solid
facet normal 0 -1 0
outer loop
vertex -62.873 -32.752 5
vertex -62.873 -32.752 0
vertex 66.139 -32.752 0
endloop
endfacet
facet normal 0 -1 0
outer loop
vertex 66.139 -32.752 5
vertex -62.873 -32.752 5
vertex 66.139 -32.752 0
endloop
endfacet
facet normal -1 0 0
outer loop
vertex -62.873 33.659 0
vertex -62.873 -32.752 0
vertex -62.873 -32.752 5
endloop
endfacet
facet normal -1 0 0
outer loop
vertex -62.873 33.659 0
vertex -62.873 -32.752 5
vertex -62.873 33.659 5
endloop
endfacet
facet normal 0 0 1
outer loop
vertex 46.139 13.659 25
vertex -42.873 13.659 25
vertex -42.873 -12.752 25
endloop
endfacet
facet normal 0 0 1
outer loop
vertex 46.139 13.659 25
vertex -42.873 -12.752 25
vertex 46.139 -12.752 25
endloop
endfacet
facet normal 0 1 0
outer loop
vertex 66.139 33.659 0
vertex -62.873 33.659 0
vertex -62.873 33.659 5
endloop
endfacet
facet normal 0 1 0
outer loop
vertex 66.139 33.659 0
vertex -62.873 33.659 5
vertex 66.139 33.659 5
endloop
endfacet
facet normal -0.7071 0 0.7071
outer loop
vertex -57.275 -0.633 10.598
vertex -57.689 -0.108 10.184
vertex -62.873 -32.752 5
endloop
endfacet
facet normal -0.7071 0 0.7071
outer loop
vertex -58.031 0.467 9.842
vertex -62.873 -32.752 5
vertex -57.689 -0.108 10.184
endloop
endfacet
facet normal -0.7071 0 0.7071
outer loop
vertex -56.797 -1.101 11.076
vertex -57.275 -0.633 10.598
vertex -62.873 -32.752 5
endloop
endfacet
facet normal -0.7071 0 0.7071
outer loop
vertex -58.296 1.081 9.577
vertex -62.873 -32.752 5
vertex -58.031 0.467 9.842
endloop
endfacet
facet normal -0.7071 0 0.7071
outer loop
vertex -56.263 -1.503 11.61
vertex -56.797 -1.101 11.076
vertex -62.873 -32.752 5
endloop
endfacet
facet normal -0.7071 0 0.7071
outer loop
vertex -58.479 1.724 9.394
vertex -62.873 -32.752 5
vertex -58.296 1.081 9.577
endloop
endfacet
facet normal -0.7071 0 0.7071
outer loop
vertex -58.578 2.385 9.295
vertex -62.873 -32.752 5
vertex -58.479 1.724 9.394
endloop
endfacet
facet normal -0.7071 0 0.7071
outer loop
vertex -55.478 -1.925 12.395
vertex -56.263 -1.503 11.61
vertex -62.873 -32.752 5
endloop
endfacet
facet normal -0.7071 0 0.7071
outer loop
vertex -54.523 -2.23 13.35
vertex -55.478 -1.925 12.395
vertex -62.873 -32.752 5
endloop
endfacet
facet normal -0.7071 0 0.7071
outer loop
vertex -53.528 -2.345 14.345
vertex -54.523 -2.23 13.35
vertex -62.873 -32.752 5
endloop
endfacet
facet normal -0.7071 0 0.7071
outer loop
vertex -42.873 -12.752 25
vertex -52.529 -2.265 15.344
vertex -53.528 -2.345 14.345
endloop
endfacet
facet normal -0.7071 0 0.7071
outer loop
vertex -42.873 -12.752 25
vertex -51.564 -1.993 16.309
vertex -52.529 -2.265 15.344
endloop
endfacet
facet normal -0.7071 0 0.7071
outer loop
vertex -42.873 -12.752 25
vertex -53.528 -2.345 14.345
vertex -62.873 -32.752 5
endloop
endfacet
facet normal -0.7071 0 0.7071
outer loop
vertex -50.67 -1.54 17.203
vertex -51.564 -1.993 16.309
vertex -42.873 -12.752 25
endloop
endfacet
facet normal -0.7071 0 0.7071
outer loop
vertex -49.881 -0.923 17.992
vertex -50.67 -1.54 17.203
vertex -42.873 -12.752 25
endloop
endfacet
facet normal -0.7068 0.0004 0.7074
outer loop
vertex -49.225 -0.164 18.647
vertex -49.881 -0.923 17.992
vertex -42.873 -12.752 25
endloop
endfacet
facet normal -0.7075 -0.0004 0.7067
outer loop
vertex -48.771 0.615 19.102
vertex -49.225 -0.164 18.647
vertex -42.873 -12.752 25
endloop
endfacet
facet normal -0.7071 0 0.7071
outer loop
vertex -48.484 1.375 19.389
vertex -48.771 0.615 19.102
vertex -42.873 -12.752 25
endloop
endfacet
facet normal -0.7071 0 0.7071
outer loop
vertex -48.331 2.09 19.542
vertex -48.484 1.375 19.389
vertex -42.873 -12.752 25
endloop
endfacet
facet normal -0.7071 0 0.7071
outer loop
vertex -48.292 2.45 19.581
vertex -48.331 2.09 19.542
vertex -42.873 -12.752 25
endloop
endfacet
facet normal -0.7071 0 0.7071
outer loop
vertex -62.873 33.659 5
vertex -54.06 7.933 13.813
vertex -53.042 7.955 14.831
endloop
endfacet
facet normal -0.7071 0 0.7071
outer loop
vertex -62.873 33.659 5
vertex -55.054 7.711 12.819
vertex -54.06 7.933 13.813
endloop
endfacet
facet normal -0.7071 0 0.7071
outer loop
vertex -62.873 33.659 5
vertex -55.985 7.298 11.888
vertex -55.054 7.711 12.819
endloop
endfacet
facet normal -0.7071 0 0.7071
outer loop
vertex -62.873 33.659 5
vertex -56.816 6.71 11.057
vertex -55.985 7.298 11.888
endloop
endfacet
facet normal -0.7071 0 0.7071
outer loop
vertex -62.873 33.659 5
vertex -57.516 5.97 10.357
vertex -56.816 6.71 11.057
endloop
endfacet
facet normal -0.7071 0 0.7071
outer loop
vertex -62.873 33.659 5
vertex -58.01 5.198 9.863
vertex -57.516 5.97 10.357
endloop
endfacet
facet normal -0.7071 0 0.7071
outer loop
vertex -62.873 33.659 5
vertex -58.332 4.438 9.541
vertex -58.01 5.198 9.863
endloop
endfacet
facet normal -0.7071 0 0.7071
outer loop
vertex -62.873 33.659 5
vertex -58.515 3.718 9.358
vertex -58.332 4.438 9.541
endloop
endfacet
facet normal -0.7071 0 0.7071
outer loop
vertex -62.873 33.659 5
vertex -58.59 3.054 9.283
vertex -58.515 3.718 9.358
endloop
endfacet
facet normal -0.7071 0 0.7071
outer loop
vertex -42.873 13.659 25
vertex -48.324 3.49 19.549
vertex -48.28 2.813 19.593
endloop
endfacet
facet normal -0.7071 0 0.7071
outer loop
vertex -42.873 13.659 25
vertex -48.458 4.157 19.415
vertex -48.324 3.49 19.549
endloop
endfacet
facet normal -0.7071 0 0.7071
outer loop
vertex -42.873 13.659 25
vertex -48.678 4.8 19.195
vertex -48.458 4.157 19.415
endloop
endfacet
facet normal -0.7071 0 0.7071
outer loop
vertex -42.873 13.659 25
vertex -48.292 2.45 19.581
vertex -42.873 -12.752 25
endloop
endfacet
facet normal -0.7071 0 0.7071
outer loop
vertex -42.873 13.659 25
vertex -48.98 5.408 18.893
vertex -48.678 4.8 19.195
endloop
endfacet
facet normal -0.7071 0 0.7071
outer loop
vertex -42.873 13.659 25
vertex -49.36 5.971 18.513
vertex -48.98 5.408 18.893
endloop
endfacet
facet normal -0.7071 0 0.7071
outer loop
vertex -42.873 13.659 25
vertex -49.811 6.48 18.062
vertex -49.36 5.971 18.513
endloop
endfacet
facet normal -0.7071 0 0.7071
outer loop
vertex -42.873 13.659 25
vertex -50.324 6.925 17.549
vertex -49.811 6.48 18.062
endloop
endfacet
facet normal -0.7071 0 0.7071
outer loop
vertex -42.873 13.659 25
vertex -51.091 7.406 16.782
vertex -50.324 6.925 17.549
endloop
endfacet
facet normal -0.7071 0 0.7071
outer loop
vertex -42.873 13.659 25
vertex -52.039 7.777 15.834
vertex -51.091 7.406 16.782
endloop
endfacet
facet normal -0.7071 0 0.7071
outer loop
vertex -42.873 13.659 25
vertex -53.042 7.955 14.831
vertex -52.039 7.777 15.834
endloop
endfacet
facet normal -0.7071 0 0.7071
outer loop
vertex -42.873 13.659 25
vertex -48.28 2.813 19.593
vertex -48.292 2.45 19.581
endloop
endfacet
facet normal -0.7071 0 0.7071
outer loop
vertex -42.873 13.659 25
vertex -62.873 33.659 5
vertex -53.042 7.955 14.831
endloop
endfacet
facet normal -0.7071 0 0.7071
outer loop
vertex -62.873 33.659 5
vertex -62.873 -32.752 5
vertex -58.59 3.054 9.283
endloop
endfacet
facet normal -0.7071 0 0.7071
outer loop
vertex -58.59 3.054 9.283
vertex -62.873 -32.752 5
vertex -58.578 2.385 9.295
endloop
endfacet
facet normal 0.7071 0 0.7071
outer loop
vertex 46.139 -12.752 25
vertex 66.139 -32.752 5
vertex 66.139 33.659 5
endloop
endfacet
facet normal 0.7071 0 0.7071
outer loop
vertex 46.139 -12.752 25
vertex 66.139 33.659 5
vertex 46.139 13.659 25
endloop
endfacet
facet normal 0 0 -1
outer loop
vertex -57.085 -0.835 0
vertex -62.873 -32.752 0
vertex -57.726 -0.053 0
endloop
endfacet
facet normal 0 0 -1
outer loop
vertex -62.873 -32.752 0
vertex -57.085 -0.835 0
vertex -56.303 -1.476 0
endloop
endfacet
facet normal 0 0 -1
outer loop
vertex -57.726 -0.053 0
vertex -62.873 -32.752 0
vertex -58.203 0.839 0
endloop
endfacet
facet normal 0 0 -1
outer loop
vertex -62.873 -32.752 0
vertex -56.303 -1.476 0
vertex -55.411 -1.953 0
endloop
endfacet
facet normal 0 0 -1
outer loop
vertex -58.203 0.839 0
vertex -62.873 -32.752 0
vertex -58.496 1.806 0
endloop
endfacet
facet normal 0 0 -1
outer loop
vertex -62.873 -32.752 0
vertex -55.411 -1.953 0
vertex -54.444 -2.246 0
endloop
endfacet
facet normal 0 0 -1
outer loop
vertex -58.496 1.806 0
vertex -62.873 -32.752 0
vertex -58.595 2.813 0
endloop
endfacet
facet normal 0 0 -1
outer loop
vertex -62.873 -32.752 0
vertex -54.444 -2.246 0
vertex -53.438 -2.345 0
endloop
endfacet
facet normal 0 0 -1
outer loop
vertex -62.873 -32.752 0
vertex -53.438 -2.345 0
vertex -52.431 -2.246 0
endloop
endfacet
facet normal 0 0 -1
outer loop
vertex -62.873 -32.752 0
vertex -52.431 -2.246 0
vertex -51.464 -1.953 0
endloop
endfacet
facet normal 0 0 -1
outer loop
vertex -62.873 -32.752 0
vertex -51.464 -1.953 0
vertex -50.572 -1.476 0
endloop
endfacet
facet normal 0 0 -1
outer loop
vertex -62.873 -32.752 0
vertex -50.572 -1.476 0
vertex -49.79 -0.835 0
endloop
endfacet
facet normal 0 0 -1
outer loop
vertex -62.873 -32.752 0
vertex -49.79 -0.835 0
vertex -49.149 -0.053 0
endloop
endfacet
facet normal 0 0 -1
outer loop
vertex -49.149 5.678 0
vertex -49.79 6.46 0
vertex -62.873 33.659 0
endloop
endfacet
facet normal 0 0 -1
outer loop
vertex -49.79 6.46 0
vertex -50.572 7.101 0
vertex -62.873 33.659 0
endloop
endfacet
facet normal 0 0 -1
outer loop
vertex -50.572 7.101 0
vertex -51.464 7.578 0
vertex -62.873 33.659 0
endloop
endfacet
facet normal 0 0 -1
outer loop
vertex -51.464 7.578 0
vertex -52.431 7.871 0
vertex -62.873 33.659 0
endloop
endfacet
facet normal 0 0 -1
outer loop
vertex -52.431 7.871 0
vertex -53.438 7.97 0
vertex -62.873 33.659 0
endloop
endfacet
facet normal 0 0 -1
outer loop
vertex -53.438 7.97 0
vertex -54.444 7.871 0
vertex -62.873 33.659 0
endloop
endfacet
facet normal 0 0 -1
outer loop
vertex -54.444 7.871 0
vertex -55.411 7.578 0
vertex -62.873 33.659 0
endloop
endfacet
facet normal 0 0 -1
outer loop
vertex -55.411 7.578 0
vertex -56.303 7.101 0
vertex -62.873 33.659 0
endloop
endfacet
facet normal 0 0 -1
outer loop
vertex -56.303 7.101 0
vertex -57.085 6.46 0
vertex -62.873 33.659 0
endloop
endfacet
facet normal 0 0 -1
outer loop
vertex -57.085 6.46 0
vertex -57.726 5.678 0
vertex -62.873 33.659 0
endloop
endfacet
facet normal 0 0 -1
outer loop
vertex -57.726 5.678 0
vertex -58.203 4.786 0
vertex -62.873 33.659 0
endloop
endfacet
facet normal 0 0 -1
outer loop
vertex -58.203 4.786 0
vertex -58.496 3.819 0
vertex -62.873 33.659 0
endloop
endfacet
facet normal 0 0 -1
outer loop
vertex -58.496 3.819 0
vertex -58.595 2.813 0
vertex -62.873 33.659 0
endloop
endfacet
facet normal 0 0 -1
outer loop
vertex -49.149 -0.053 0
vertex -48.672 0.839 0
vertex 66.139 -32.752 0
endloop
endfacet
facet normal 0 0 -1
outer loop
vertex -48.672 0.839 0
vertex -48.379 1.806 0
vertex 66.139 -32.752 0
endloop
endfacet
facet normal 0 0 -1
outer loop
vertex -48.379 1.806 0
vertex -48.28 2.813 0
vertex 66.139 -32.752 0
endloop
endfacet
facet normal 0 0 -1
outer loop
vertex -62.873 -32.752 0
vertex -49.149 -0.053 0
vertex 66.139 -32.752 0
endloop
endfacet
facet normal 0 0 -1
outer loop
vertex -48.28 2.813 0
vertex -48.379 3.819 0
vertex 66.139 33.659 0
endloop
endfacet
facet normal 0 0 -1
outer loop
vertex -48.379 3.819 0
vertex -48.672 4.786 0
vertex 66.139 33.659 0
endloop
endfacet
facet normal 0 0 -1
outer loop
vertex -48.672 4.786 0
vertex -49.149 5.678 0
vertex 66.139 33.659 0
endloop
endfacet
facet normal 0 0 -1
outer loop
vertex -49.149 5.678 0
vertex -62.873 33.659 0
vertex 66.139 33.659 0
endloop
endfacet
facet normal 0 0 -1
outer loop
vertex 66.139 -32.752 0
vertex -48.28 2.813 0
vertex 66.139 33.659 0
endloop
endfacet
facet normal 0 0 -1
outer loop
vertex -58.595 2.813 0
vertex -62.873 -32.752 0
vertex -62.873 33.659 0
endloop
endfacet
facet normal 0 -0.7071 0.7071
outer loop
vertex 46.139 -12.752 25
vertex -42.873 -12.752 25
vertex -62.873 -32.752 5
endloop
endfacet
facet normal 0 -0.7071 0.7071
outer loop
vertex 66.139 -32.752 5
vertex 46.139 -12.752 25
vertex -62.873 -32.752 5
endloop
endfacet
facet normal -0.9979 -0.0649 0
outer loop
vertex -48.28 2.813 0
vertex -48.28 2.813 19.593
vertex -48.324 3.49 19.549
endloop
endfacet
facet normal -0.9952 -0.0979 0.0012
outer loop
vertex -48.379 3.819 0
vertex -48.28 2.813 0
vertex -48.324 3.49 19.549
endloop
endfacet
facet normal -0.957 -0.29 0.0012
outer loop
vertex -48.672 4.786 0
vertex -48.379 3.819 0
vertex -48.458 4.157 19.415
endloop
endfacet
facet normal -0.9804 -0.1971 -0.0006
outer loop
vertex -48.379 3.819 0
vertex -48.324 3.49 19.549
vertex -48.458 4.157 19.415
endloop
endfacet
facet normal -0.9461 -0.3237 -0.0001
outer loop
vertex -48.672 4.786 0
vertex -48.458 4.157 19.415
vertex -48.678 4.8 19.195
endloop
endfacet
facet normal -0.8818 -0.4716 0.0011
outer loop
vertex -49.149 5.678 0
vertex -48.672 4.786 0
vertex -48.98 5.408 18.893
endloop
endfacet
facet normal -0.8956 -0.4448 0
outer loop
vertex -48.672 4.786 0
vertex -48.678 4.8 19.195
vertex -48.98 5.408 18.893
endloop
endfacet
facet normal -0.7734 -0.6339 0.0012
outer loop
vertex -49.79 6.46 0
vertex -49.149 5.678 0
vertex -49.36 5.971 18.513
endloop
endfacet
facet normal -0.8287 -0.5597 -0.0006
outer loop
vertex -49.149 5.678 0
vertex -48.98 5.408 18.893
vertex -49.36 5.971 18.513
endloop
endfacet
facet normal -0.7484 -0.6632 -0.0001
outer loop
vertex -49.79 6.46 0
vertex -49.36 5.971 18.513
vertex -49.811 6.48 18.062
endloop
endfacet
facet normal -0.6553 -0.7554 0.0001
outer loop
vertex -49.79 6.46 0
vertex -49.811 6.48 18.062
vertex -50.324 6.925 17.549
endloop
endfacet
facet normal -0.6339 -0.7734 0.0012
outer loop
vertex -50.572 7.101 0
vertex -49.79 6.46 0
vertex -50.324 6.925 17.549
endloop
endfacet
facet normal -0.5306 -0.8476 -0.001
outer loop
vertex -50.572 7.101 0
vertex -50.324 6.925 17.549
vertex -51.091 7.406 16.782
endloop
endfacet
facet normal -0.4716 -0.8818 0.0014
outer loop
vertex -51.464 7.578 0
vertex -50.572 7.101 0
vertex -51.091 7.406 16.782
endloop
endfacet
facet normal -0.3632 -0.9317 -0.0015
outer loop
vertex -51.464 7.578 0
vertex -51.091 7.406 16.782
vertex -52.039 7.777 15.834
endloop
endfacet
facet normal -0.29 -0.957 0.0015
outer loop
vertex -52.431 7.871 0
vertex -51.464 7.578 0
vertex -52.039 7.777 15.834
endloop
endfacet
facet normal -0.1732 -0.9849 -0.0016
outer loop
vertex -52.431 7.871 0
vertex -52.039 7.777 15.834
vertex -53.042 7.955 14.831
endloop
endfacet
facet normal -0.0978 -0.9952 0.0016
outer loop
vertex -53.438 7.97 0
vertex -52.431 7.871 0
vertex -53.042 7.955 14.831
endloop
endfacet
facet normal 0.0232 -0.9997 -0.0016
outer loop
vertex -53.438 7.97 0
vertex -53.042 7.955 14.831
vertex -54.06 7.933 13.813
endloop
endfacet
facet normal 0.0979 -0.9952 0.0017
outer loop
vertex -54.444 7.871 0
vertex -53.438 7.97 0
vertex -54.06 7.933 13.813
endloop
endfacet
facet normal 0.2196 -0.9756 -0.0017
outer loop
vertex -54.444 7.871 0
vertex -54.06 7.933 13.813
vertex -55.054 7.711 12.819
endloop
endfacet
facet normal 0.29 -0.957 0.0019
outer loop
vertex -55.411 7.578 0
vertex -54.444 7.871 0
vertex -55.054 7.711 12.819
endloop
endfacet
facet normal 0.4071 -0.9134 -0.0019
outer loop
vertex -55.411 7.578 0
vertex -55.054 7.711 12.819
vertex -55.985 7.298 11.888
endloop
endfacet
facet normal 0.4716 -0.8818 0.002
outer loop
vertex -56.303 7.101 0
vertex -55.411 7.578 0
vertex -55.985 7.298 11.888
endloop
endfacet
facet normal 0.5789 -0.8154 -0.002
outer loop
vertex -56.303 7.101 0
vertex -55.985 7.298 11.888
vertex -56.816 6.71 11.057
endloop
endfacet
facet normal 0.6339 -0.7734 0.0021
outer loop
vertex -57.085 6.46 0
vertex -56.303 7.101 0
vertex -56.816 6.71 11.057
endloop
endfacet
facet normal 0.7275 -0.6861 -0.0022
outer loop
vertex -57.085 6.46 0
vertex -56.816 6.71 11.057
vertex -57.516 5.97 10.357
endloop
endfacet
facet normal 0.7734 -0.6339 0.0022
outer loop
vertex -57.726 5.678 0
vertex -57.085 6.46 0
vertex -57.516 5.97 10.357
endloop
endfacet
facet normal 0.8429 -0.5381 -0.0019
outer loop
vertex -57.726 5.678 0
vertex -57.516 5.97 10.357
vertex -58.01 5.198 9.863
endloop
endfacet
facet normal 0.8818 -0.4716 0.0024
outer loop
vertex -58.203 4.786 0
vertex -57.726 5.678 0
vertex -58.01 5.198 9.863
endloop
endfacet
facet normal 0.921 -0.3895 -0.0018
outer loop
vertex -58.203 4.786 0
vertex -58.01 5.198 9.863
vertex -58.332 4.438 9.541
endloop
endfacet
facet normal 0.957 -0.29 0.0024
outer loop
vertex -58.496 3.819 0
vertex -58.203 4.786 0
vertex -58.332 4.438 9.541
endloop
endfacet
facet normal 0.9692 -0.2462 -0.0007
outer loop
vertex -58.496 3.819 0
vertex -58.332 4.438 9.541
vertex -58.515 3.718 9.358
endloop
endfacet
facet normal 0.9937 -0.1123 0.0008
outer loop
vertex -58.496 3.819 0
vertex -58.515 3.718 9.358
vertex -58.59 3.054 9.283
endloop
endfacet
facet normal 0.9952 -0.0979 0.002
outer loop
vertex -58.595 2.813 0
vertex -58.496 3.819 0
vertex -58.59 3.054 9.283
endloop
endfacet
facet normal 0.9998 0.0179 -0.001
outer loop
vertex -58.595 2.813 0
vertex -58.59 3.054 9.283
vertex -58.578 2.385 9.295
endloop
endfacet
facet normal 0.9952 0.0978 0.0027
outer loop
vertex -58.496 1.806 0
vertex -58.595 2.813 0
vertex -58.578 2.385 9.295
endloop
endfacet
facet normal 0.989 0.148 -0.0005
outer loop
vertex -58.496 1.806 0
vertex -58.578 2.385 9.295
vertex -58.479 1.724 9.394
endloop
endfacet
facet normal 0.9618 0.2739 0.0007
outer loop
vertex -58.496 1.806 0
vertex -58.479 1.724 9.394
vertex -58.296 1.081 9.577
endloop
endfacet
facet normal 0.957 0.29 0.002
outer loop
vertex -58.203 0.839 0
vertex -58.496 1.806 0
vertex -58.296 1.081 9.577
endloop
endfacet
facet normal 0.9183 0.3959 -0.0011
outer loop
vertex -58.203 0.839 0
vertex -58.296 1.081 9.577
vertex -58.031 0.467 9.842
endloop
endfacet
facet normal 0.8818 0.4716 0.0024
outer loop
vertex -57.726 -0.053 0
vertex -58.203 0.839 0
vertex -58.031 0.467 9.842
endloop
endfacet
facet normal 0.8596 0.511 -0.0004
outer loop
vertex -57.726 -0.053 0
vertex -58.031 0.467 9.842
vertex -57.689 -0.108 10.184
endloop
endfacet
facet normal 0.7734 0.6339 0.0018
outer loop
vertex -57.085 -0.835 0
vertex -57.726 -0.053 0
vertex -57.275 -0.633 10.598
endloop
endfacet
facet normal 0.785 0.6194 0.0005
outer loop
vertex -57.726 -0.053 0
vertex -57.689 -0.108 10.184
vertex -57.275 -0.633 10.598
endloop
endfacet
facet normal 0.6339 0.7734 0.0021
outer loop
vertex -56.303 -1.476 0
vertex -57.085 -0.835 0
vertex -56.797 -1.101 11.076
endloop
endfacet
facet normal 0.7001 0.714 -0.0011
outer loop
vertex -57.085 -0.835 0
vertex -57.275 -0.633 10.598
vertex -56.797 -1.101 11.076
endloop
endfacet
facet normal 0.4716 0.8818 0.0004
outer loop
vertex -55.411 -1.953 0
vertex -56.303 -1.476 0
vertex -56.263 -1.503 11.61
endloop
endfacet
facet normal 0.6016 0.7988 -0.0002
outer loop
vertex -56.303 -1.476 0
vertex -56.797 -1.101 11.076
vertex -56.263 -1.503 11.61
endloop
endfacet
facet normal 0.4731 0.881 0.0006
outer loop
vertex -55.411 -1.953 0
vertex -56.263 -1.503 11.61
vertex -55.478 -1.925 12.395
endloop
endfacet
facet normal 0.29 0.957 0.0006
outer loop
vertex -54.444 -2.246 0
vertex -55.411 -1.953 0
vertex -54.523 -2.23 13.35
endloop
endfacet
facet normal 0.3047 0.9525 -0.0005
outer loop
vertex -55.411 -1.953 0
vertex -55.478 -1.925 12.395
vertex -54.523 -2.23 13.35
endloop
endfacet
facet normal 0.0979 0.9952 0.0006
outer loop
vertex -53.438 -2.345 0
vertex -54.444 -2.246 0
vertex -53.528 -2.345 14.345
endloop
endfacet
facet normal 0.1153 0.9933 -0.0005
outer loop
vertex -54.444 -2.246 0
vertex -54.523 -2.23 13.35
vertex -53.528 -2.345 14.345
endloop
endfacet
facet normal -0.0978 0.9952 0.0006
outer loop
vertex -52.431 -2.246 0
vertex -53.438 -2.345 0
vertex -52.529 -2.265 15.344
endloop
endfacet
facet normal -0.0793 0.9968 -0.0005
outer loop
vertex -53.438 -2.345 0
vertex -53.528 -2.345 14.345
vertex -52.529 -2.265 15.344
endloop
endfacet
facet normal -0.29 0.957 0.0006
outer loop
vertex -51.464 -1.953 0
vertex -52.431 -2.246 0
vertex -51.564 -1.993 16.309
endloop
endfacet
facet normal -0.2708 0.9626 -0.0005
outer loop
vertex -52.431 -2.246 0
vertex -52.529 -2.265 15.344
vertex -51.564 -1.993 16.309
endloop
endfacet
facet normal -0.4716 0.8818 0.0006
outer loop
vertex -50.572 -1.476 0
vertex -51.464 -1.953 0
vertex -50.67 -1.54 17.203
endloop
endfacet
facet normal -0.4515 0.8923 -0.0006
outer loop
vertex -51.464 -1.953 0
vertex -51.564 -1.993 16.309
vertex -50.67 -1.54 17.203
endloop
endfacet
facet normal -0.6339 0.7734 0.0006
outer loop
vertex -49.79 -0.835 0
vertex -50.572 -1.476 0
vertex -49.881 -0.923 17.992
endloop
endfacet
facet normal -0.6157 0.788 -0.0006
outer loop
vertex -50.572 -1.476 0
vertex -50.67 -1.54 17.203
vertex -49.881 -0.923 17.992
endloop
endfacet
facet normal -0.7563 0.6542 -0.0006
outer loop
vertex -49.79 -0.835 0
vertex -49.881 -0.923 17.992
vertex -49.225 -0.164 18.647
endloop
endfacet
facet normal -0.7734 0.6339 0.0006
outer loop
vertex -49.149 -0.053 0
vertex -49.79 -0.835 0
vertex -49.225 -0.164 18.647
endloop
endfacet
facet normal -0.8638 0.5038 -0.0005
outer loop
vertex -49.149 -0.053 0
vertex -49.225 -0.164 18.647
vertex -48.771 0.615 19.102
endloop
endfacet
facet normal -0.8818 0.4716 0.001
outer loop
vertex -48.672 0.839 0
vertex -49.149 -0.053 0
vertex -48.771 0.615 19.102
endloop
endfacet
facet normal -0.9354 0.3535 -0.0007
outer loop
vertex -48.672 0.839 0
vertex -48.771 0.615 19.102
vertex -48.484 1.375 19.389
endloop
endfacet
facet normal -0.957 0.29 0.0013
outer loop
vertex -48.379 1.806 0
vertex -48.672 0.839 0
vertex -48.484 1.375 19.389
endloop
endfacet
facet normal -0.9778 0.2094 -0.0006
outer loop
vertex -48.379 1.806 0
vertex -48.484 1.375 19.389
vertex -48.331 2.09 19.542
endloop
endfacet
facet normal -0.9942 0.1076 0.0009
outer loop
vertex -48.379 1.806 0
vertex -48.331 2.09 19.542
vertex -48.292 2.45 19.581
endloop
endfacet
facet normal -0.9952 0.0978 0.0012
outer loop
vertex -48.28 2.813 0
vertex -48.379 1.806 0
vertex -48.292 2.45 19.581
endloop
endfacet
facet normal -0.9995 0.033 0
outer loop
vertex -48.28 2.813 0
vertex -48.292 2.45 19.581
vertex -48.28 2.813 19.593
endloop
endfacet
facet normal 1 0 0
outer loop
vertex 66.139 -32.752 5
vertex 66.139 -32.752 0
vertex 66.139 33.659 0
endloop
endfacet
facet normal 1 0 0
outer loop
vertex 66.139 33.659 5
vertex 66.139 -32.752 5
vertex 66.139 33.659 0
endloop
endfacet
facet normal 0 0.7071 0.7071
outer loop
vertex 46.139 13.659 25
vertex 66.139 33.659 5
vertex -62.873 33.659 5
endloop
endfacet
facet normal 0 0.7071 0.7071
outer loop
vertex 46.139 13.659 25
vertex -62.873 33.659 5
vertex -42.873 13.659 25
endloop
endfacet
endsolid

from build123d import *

# Parameters (mm, degrees)
F0_W        = 129.0121003985
F0_H        = 66.4112940431
F1_DEPTH    = 25
F2_R        = 5.1578241127
F3_DEPTH    = 25
F4_T1_DEPTH = 231.8794199172
F4_T3_DEPTH = 169.2786135617


# Not quite as in the source:
# - a fillet or chamfer that OpenCascade refuses, or shapes differently, is made with other operations: its cross-section is extruded or revolved along the edge and cut away or added


with BuildPart() as f1:
    # F0 (on Top) → F1 (new body)
    with BuildSketch(Plane.XY):
        with Locations((1.633066684, 0.4536285996)):
            Rectangle(F0_W, F0_H)
    extrude(amount=F1_DEPTH)

    # F2 (on face) → F3 (cut)
    with BuildSketch(Plane.XY.offset(25)):
        with Locations((-53.4375011921, 2.8125003446)):
            Circle(F2_R)
    extrude(amount=-F3_DEPTH, mode=Mode.SUBTRACT)

    # F4: chamfer of 20 on 4 edges, made by hand

    # F4_s2 → F4_t1 (cut)
    with BuildSketch(Plane.YZ.offset(-114.3066432746)):
        Polygon((-12.7520184219, 25), (-32.7520184219, 5), (-32.7520184219, 25), align=None)
        Polygon((33.6592756212, 5), (13.6592756212, 25), (33.6592756212, 25), align=None)
    extrude(amount=F4_T1_DEPTH, mode=Mode.SUBTRACT)

    # F4_s4 → F4_t3 (cut)
    with BuildSketch(Plane.XZ.offset(-85.0929353805)):
        Polygon((-62.8729835153, 5), (-42.8729835153, 25), (-62.8729835153, 25), align=None)
        Polygon((66.1391168833, 5), (46.1391168833, 25), (66.1391168833, 25), align=None)
    extrude(amount=F4_T3_DEPTH, mode=Mode.SUBTRACT)


solid = f1.part
